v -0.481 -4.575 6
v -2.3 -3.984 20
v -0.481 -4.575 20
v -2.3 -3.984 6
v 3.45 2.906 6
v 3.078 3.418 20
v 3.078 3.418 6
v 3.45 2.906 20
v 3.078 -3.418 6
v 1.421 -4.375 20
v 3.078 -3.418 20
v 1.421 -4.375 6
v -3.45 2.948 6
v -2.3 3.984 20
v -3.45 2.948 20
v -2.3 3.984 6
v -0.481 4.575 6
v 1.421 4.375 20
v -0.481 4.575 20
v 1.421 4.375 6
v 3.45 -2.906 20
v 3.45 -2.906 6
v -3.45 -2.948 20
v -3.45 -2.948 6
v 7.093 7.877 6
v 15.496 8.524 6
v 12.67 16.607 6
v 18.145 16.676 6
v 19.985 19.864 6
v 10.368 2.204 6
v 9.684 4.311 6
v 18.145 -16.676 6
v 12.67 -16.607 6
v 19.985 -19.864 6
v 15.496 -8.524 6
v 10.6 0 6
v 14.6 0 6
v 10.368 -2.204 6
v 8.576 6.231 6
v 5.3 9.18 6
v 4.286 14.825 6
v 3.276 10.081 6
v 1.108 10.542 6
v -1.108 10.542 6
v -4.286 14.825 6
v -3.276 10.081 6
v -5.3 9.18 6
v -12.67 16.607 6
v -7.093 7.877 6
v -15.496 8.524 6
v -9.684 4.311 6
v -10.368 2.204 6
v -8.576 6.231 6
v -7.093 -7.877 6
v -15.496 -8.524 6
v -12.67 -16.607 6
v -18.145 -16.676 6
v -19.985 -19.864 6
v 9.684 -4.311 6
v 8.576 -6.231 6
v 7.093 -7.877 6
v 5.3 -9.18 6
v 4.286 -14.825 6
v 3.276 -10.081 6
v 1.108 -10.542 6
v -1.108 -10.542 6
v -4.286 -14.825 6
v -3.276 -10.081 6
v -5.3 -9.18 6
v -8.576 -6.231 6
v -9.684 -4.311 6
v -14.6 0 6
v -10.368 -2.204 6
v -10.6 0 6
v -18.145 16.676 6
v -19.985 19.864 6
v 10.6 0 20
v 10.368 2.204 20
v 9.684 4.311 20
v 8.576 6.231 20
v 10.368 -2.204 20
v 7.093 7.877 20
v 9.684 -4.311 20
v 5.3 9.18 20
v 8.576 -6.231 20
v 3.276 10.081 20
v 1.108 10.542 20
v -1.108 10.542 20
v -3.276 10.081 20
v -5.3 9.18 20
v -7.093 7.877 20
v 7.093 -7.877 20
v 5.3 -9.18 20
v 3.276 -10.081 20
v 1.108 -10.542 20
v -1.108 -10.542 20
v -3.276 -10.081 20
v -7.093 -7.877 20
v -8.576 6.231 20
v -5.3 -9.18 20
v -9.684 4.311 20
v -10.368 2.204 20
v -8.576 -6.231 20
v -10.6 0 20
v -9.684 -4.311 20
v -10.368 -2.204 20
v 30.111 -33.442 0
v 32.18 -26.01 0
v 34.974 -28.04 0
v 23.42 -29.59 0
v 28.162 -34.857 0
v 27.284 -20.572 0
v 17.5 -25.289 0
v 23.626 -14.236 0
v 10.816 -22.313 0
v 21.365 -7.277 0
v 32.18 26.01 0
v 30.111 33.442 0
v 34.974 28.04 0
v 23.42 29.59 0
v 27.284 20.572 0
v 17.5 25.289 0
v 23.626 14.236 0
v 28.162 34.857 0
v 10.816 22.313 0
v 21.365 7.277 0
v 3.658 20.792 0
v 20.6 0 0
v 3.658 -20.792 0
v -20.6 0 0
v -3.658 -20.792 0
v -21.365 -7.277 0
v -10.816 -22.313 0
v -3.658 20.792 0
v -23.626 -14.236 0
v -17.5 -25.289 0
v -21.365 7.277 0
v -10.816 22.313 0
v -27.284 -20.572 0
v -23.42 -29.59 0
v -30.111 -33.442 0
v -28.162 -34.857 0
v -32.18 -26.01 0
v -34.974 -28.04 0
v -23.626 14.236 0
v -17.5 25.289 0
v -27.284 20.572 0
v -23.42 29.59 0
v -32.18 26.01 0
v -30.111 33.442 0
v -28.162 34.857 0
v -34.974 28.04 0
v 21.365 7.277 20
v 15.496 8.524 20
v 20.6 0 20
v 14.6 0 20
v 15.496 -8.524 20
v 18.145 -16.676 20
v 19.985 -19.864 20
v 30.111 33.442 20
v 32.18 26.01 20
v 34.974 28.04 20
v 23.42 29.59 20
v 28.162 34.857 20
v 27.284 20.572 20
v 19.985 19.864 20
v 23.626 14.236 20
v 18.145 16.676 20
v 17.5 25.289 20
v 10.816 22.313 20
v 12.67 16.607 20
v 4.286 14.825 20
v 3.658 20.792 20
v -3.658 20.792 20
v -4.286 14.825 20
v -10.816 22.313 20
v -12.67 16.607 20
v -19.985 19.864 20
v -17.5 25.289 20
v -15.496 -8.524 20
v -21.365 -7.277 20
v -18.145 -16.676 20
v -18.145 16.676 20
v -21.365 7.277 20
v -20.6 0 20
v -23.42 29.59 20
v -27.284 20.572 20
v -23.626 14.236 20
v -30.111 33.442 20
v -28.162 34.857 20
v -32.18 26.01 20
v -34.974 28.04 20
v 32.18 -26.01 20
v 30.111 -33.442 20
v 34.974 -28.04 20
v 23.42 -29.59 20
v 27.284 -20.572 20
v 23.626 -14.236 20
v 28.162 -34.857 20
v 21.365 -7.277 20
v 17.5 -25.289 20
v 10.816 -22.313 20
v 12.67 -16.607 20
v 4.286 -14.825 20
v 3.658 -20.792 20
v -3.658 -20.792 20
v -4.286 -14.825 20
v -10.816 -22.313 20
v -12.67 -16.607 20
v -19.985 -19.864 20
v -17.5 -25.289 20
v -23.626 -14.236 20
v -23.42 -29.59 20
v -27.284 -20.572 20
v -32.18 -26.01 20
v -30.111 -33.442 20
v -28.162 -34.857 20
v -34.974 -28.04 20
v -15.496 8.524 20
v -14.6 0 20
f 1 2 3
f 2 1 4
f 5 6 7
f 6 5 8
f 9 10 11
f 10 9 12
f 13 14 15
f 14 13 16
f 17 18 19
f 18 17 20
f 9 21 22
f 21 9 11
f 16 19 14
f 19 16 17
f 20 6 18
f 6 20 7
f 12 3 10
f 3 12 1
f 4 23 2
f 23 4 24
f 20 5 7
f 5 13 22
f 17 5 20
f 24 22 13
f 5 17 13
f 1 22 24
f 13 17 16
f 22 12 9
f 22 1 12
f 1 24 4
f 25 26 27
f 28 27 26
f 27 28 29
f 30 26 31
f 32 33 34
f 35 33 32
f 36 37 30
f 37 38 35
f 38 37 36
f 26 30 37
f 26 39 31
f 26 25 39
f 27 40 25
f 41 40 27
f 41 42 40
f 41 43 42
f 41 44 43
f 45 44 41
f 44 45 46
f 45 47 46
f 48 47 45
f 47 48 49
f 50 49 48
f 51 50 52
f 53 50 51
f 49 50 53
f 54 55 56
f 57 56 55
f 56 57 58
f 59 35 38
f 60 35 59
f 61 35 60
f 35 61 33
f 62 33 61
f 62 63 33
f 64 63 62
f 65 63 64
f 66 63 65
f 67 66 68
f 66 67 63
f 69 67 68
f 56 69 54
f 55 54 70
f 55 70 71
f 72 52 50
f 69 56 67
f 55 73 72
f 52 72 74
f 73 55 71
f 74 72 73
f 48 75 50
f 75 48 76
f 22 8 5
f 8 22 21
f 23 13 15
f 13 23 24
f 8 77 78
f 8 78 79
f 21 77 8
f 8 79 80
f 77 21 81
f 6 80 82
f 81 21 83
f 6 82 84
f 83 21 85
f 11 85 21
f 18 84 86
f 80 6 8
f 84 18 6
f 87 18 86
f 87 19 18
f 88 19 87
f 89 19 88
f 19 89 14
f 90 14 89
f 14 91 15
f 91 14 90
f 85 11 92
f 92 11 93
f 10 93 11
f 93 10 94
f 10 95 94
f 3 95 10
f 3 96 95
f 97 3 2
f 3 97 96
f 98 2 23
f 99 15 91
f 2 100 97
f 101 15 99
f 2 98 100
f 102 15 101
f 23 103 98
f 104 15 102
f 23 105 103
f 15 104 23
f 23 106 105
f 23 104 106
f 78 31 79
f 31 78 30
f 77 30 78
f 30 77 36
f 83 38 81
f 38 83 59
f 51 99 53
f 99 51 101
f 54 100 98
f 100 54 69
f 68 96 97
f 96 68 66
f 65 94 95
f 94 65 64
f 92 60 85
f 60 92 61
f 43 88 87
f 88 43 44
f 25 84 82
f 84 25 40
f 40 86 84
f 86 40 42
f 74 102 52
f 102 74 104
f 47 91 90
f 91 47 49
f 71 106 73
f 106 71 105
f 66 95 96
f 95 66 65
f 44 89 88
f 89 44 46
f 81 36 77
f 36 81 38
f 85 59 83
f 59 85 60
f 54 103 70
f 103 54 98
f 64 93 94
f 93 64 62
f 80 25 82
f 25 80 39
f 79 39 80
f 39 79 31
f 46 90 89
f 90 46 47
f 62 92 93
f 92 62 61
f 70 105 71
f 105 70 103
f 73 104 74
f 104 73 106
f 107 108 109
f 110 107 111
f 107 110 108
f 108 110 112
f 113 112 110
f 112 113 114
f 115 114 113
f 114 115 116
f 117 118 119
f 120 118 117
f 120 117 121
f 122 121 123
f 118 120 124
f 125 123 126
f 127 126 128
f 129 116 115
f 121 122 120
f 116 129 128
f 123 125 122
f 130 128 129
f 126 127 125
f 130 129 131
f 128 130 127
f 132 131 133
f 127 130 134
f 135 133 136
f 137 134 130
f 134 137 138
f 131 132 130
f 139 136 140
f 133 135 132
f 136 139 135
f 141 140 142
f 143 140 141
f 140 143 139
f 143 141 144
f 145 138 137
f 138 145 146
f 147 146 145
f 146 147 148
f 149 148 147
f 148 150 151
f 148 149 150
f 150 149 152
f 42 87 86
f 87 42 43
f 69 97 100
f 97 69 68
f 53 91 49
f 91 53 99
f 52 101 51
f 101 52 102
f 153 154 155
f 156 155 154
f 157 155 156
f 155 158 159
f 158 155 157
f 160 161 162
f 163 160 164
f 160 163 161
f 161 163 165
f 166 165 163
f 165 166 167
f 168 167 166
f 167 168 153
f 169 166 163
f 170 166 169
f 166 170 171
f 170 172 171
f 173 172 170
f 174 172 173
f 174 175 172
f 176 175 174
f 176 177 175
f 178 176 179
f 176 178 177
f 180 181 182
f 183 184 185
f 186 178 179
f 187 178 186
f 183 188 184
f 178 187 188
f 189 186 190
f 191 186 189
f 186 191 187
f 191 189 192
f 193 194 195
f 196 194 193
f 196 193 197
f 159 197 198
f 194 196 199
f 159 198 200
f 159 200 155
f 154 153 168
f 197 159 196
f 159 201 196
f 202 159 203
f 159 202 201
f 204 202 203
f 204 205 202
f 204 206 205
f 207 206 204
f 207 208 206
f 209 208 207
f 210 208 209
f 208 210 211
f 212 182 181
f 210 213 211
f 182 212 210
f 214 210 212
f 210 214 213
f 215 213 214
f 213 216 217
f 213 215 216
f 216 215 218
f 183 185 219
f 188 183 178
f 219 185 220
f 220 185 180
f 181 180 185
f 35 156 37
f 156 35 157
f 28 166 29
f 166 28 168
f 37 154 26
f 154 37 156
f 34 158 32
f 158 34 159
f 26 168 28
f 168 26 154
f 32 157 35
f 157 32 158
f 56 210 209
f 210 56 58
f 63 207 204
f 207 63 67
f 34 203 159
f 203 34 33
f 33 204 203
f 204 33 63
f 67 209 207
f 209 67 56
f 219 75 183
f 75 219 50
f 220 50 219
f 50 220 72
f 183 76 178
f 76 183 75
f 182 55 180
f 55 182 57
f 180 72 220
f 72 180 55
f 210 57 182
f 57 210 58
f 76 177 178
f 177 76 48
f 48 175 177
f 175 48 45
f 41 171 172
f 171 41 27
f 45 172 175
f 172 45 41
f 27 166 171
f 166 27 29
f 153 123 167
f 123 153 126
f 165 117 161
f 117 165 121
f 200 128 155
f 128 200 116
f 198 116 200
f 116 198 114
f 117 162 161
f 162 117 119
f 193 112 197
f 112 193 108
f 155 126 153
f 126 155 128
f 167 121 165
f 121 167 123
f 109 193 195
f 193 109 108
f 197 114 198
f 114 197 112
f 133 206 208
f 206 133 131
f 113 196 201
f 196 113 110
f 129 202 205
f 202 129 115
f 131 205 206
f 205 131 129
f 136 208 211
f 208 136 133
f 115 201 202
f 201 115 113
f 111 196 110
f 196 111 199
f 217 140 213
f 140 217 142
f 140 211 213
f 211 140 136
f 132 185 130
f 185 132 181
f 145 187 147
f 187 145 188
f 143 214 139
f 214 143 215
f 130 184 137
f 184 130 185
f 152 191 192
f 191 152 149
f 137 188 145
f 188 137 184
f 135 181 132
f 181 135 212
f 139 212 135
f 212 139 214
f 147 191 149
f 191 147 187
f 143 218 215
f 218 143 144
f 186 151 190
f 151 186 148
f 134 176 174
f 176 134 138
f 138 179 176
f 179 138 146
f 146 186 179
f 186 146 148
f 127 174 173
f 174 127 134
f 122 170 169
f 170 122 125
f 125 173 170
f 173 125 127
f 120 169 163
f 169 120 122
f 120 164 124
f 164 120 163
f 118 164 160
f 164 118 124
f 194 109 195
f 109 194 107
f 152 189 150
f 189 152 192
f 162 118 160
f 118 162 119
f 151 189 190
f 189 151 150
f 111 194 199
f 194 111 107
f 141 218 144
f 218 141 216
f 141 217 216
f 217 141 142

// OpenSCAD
thickness=20;
outer_r=45;
knob_r=35;
bolt_r=4.6;
wall_thickness=6;
square_ratio=1.5;


union(){
	difference(){
		cylinder(r=bolt_r+wall_thickness,h=thickness);
		intersection(){
			translate([0,0,wall_thickness])cylinder(r=bolt_r,h=thickness);
			translate([-square_ratio*.5*bolt_r,-bolt_r*2,wall_thickness])cube([square_ratio*bolt_r,bolt_r*4,thickness]);
		}
	}
	intersection(){
		difference(){
			union(){
				difference(){
					cylinder(r=outer_r,h=thickness);
					translate([0,0,wall_thickness])cylinder(r=outer_r-wall_thickness,h=thickness);
					}
				translate([(outer_r+bolt_r+wall_thickness)*sin(90),(outer_r+bolt_r+wall_thickness)*cos(90),0])cylinder(r=knob_r+wall_thickness,h=thickness);
				translate([(outer_r+bolt_r+wall_thickness)*sin(180),(outer_r+bolt_r+wall_thickness)*cos(180),0])cylinder(r=knob_r+wall_thickness,h=thickness);
				translate([(outer_r+bolt_r+wall_thickness)*sin(270),(outer_r+bolt_r+wall_thickness)*cos(270),0])cylinder(r=knob_r+wall_thickness,h=thickness);
				translate([(outer_r+bolt_r+wall_thickness)*sin(360),(outer_r+bolt_r+wall_thickness)*cos(360),0])cylinder(r=knob_r+wall_thickness,h=thickness);
			}

			translate([(outer_r+bolt_r+wall_thickness)*sin(90),(outer_r+bolt_r+wall_thickness)*cos(90),-wall_thickness])cylinder(r=knob_r,h=thickness+wall_thickness*2);
			translate([(outer_r+bolt_r+wall_thickness)*sin(180),(outer_r+bolt_r+wall_thickness)*cos(180),-wall_thickness])cylinder(r=knob_r,h=thickness+wall_thickness*2);
			translate([(outer_r+bolt_r+wall_thickness)*sin(270),(outer_r+bolt_r+wall_thickness)*cos(270),-wall_thickness])cylinder(r=knob_r,h=thickness+wall_thickness*2);
			translate([(outer_r+bolt_r+wall_thickness)*sin(360),(outer_r+bolt_r+wall_thickness)*cos(360),-wall_thickness])cylinder(r=knob_r,h=thickness+wall_thickness*2);
		}
	cylinder(r=outer_r,h=thickness);
	}
}
